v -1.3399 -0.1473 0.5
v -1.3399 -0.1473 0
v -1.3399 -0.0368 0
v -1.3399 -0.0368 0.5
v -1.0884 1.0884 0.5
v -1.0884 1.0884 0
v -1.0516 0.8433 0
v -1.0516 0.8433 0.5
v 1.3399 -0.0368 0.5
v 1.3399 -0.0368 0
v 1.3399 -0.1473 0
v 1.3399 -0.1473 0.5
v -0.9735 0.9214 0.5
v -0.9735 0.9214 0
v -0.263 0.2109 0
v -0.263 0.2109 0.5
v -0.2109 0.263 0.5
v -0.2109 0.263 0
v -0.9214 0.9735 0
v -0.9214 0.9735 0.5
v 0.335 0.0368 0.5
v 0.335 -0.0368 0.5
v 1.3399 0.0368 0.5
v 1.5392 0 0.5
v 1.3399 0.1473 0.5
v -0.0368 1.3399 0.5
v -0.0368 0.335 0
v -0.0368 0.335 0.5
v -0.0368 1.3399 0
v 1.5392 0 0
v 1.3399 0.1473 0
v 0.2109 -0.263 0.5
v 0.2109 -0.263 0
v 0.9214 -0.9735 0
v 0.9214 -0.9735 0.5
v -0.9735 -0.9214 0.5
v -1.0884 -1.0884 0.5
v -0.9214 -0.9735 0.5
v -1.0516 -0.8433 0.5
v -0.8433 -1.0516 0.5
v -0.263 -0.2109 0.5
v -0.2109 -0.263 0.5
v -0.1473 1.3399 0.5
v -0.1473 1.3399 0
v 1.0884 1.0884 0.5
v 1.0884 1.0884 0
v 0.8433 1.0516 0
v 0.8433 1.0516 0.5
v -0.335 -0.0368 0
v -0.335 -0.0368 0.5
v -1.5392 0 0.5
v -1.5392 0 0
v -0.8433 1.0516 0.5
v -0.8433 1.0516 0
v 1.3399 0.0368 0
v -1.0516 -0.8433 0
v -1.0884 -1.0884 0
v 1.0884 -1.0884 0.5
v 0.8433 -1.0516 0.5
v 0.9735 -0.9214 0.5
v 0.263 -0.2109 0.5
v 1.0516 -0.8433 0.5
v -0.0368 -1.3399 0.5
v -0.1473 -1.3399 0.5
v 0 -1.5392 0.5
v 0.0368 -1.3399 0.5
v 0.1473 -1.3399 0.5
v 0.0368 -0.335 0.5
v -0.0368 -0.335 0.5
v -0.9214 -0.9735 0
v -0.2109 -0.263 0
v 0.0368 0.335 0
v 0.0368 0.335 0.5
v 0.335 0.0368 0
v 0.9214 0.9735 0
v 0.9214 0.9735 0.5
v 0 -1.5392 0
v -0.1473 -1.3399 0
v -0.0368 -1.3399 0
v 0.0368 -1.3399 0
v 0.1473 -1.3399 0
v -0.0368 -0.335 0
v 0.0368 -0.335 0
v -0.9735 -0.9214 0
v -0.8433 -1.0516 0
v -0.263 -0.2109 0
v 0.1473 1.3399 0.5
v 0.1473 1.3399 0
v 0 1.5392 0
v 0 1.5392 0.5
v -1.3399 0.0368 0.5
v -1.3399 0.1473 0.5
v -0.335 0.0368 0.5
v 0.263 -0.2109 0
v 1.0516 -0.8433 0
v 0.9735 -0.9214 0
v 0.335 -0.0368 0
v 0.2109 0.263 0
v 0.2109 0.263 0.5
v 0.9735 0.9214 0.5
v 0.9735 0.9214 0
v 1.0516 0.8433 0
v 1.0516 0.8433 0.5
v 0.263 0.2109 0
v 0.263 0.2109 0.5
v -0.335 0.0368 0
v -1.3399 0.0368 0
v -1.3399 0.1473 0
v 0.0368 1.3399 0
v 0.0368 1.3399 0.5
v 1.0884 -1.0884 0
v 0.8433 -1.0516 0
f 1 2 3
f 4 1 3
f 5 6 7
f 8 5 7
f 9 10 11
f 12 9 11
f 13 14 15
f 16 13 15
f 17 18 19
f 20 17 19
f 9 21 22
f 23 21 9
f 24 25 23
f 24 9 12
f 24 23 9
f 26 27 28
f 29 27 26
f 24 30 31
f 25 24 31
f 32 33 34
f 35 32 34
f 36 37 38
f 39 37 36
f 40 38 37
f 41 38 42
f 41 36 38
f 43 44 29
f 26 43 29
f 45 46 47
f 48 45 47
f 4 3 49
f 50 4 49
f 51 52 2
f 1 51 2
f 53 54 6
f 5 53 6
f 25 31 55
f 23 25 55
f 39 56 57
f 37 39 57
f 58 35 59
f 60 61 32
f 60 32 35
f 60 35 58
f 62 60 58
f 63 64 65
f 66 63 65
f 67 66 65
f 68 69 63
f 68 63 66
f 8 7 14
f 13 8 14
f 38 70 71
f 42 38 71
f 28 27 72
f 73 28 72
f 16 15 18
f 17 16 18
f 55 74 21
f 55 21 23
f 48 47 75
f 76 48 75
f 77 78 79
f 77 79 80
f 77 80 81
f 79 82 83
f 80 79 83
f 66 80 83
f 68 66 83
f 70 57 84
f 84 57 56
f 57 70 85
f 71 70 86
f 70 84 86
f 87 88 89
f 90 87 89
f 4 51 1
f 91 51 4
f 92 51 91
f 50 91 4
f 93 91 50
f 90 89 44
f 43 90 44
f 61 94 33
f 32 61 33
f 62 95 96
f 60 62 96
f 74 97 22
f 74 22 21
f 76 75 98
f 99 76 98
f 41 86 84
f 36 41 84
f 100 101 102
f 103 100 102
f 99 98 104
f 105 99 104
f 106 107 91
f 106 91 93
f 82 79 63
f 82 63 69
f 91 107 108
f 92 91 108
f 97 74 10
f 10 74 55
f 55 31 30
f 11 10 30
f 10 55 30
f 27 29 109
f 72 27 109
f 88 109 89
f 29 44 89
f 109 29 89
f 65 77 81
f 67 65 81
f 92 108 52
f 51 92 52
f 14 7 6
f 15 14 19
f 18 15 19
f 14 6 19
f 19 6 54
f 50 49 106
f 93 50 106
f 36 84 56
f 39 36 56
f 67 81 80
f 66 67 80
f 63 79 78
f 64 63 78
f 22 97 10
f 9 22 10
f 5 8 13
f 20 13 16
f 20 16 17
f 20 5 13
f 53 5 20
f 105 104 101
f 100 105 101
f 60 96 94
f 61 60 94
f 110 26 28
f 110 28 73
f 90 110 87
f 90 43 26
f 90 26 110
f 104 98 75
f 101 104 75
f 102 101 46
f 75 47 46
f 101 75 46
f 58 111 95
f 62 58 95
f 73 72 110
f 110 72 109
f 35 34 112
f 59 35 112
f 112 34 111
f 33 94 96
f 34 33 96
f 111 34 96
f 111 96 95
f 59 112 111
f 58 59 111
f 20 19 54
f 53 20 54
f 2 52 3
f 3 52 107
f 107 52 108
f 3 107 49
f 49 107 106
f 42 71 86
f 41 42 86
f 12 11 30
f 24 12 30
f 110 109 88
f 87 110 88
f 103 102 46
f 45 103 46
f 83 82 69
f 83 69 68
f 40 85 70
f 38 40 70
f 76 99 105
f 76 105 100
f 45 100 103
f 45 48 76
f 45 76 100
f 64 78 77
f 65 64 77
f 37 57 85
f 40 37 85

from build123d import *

# Parameters (mm, degrees)
F1_DEPTH = 0.5
F0_W     = 0.073666525
F0_H     = 1.0048788058
F0_W_2   = 1.0048788058
F0_H_2   = 0.073666525


with BuildPart() as f1:
    # F0 (on Top) → F1 (new body)
    with BuildSketch(Plane.XY):
        Polygon((0.9735095352, -0.9214194358), (0.9214194358, -0.9735095352), (0.8432842867, -1.0516446842), (1.0883771669, -1.0883771669), (1.0516446842, -0.8432842867), align=None)
        Polygon((0.210862818, -0.2629529173), (0.9214194358, -0.9735095352), (0.9735095352, -0.9214194358), (0.2629529173, -0.210862818), align=None)
    extrude(amount=F1_DEPTH)


with BuildPart() as f1b:
    # F0 (on Top) → F1, piece 2 (new body)
    with BuildSketch(Plane.XY):
        Polygon((-0.210862818, 0.2629529173), (-0.9214194358, 0.9735095352), (-0.9735095352, 0.9214194358), (-0.2629529173, 0.210862818), align=None)
        Polygon((-0.9735095352, 0.9214194358), (-0.9214194358, 0.9735095352), (-0.8432842867, 1.0516446842), (-1.0883771669, 1.0883771669), (-1.0516446842, 0.8432842867), align=None)
    extrude(amount=F1_DEPTH)


with BuildPart() as f1c:
    # F0 (on Top) → F1, piece 3 (new body)
    with BuildSketch(Plane.XY):
        Polygon((-0.9214194358, -0.9735095352), (-0.9735095352, -0.9214194358), (-1.0516446842, -0.8432842867), (-1.0883771669, -1.0883771669), (-0.8432842867, -1.0516446842), align=None)
        Polygon((-0.2629529173, -0.210862818), (-0.9735095352, -0.9214194358), (-0.9214194358, -0.9735095352), (-0.210862818, -0.2629529173), align=None)
    extrude(amount=F1_DEPTH)


with BuildPart() as f1d:
    # F0 (on Top) → F1, piece 4 (new body)
    with BuildSketch(Plane.XY):
        with Locations((0, -0.8374777224)):
            Rectangle(F0_W, F0_H)
        Polygon((0.0368332625, -1.3399171252), (-0.0368332625, -1.3399171252), (-0.14733305, -1.3399171252), (0, -1.5391977504), (0.14733305, -1.3399171252), align=None)
    extrude(amount=F1_DEPTH)


with BuildPart() as f1e:
    # F0 (on Top) → F1, piece 5 (new body)
    with BuildSketch(Plane.XY):
        Polygon((-1.3399171252, -0.0368332625), (-1.3399171252, 0.0368332625), (-1.3399171252, 0.14733305), (-1.5391977504, 0), (-1.3399171252, -0.14733305), align=None)
        with Locations((-0.8374777224, 0)):
            Rectangle(F0_W_2, F0_H_2)
    extrude(amount=F1_DEPTH)


with BuildPart() as f1f:
    # F0 (on Top) → F1, piece 6 (new body)
    with BuildSketch(Plane.XY):
        with Locations((0, 0.8374777224)):
            Rectangle(F0_W, F0_H)
        Polygon((-0.14733305, 1.3399171252), (-0.0368332625, 1.3399171252), (0.0368332625, 1.3399171252), (0.14733305, 1.3399171252), (0, 1.5391977504), align=None)
    extrude(amount=F1_DEPTH)


with BuildPart() as f1g:
    # F0 (on Top) → F1, piece 7 (new body)
    with BuildSketch(Plane.XY):
        Polygon((0.9735095352, 0.9214194358), (0.9214194358, 0.9735095352), (0.210862818, 0.2629529173), (0.2629529173, 0.210862818), align=None)
        Polygon((1.0883771669, 1.0883771669), (0.8432842867, 1.0516446842), (0.9214194358, 0.9735095352), (0.9735095352, 0.9214194358), (1.0516446842, 0.8432842867), align=None)
    extrude(amount=F1_DEPTH)


with BuildPart() as f1h:
    # F0 (on Top) → F1, piece 8 (new body)
    with BuildSketch(Plane.XY):
        Polygon((1.5391977504, 0), (1.3399171252, 0.14733305), (1.3399171252, 0.0368332625), (1.3399171252, -0.0368332625), (1.3399171252, -0.14733305), align=None)
        with Locations((0.8374777224, 0)):
            Rectangle(F0_W_2, F0_H_2)
    extrude(amount=F1_DEPTH)


solid = Compound([f1.part, f1b.part, f1c.part, f1d.part, f1e.part, f1f.part, f1g.part, f1h.part])
